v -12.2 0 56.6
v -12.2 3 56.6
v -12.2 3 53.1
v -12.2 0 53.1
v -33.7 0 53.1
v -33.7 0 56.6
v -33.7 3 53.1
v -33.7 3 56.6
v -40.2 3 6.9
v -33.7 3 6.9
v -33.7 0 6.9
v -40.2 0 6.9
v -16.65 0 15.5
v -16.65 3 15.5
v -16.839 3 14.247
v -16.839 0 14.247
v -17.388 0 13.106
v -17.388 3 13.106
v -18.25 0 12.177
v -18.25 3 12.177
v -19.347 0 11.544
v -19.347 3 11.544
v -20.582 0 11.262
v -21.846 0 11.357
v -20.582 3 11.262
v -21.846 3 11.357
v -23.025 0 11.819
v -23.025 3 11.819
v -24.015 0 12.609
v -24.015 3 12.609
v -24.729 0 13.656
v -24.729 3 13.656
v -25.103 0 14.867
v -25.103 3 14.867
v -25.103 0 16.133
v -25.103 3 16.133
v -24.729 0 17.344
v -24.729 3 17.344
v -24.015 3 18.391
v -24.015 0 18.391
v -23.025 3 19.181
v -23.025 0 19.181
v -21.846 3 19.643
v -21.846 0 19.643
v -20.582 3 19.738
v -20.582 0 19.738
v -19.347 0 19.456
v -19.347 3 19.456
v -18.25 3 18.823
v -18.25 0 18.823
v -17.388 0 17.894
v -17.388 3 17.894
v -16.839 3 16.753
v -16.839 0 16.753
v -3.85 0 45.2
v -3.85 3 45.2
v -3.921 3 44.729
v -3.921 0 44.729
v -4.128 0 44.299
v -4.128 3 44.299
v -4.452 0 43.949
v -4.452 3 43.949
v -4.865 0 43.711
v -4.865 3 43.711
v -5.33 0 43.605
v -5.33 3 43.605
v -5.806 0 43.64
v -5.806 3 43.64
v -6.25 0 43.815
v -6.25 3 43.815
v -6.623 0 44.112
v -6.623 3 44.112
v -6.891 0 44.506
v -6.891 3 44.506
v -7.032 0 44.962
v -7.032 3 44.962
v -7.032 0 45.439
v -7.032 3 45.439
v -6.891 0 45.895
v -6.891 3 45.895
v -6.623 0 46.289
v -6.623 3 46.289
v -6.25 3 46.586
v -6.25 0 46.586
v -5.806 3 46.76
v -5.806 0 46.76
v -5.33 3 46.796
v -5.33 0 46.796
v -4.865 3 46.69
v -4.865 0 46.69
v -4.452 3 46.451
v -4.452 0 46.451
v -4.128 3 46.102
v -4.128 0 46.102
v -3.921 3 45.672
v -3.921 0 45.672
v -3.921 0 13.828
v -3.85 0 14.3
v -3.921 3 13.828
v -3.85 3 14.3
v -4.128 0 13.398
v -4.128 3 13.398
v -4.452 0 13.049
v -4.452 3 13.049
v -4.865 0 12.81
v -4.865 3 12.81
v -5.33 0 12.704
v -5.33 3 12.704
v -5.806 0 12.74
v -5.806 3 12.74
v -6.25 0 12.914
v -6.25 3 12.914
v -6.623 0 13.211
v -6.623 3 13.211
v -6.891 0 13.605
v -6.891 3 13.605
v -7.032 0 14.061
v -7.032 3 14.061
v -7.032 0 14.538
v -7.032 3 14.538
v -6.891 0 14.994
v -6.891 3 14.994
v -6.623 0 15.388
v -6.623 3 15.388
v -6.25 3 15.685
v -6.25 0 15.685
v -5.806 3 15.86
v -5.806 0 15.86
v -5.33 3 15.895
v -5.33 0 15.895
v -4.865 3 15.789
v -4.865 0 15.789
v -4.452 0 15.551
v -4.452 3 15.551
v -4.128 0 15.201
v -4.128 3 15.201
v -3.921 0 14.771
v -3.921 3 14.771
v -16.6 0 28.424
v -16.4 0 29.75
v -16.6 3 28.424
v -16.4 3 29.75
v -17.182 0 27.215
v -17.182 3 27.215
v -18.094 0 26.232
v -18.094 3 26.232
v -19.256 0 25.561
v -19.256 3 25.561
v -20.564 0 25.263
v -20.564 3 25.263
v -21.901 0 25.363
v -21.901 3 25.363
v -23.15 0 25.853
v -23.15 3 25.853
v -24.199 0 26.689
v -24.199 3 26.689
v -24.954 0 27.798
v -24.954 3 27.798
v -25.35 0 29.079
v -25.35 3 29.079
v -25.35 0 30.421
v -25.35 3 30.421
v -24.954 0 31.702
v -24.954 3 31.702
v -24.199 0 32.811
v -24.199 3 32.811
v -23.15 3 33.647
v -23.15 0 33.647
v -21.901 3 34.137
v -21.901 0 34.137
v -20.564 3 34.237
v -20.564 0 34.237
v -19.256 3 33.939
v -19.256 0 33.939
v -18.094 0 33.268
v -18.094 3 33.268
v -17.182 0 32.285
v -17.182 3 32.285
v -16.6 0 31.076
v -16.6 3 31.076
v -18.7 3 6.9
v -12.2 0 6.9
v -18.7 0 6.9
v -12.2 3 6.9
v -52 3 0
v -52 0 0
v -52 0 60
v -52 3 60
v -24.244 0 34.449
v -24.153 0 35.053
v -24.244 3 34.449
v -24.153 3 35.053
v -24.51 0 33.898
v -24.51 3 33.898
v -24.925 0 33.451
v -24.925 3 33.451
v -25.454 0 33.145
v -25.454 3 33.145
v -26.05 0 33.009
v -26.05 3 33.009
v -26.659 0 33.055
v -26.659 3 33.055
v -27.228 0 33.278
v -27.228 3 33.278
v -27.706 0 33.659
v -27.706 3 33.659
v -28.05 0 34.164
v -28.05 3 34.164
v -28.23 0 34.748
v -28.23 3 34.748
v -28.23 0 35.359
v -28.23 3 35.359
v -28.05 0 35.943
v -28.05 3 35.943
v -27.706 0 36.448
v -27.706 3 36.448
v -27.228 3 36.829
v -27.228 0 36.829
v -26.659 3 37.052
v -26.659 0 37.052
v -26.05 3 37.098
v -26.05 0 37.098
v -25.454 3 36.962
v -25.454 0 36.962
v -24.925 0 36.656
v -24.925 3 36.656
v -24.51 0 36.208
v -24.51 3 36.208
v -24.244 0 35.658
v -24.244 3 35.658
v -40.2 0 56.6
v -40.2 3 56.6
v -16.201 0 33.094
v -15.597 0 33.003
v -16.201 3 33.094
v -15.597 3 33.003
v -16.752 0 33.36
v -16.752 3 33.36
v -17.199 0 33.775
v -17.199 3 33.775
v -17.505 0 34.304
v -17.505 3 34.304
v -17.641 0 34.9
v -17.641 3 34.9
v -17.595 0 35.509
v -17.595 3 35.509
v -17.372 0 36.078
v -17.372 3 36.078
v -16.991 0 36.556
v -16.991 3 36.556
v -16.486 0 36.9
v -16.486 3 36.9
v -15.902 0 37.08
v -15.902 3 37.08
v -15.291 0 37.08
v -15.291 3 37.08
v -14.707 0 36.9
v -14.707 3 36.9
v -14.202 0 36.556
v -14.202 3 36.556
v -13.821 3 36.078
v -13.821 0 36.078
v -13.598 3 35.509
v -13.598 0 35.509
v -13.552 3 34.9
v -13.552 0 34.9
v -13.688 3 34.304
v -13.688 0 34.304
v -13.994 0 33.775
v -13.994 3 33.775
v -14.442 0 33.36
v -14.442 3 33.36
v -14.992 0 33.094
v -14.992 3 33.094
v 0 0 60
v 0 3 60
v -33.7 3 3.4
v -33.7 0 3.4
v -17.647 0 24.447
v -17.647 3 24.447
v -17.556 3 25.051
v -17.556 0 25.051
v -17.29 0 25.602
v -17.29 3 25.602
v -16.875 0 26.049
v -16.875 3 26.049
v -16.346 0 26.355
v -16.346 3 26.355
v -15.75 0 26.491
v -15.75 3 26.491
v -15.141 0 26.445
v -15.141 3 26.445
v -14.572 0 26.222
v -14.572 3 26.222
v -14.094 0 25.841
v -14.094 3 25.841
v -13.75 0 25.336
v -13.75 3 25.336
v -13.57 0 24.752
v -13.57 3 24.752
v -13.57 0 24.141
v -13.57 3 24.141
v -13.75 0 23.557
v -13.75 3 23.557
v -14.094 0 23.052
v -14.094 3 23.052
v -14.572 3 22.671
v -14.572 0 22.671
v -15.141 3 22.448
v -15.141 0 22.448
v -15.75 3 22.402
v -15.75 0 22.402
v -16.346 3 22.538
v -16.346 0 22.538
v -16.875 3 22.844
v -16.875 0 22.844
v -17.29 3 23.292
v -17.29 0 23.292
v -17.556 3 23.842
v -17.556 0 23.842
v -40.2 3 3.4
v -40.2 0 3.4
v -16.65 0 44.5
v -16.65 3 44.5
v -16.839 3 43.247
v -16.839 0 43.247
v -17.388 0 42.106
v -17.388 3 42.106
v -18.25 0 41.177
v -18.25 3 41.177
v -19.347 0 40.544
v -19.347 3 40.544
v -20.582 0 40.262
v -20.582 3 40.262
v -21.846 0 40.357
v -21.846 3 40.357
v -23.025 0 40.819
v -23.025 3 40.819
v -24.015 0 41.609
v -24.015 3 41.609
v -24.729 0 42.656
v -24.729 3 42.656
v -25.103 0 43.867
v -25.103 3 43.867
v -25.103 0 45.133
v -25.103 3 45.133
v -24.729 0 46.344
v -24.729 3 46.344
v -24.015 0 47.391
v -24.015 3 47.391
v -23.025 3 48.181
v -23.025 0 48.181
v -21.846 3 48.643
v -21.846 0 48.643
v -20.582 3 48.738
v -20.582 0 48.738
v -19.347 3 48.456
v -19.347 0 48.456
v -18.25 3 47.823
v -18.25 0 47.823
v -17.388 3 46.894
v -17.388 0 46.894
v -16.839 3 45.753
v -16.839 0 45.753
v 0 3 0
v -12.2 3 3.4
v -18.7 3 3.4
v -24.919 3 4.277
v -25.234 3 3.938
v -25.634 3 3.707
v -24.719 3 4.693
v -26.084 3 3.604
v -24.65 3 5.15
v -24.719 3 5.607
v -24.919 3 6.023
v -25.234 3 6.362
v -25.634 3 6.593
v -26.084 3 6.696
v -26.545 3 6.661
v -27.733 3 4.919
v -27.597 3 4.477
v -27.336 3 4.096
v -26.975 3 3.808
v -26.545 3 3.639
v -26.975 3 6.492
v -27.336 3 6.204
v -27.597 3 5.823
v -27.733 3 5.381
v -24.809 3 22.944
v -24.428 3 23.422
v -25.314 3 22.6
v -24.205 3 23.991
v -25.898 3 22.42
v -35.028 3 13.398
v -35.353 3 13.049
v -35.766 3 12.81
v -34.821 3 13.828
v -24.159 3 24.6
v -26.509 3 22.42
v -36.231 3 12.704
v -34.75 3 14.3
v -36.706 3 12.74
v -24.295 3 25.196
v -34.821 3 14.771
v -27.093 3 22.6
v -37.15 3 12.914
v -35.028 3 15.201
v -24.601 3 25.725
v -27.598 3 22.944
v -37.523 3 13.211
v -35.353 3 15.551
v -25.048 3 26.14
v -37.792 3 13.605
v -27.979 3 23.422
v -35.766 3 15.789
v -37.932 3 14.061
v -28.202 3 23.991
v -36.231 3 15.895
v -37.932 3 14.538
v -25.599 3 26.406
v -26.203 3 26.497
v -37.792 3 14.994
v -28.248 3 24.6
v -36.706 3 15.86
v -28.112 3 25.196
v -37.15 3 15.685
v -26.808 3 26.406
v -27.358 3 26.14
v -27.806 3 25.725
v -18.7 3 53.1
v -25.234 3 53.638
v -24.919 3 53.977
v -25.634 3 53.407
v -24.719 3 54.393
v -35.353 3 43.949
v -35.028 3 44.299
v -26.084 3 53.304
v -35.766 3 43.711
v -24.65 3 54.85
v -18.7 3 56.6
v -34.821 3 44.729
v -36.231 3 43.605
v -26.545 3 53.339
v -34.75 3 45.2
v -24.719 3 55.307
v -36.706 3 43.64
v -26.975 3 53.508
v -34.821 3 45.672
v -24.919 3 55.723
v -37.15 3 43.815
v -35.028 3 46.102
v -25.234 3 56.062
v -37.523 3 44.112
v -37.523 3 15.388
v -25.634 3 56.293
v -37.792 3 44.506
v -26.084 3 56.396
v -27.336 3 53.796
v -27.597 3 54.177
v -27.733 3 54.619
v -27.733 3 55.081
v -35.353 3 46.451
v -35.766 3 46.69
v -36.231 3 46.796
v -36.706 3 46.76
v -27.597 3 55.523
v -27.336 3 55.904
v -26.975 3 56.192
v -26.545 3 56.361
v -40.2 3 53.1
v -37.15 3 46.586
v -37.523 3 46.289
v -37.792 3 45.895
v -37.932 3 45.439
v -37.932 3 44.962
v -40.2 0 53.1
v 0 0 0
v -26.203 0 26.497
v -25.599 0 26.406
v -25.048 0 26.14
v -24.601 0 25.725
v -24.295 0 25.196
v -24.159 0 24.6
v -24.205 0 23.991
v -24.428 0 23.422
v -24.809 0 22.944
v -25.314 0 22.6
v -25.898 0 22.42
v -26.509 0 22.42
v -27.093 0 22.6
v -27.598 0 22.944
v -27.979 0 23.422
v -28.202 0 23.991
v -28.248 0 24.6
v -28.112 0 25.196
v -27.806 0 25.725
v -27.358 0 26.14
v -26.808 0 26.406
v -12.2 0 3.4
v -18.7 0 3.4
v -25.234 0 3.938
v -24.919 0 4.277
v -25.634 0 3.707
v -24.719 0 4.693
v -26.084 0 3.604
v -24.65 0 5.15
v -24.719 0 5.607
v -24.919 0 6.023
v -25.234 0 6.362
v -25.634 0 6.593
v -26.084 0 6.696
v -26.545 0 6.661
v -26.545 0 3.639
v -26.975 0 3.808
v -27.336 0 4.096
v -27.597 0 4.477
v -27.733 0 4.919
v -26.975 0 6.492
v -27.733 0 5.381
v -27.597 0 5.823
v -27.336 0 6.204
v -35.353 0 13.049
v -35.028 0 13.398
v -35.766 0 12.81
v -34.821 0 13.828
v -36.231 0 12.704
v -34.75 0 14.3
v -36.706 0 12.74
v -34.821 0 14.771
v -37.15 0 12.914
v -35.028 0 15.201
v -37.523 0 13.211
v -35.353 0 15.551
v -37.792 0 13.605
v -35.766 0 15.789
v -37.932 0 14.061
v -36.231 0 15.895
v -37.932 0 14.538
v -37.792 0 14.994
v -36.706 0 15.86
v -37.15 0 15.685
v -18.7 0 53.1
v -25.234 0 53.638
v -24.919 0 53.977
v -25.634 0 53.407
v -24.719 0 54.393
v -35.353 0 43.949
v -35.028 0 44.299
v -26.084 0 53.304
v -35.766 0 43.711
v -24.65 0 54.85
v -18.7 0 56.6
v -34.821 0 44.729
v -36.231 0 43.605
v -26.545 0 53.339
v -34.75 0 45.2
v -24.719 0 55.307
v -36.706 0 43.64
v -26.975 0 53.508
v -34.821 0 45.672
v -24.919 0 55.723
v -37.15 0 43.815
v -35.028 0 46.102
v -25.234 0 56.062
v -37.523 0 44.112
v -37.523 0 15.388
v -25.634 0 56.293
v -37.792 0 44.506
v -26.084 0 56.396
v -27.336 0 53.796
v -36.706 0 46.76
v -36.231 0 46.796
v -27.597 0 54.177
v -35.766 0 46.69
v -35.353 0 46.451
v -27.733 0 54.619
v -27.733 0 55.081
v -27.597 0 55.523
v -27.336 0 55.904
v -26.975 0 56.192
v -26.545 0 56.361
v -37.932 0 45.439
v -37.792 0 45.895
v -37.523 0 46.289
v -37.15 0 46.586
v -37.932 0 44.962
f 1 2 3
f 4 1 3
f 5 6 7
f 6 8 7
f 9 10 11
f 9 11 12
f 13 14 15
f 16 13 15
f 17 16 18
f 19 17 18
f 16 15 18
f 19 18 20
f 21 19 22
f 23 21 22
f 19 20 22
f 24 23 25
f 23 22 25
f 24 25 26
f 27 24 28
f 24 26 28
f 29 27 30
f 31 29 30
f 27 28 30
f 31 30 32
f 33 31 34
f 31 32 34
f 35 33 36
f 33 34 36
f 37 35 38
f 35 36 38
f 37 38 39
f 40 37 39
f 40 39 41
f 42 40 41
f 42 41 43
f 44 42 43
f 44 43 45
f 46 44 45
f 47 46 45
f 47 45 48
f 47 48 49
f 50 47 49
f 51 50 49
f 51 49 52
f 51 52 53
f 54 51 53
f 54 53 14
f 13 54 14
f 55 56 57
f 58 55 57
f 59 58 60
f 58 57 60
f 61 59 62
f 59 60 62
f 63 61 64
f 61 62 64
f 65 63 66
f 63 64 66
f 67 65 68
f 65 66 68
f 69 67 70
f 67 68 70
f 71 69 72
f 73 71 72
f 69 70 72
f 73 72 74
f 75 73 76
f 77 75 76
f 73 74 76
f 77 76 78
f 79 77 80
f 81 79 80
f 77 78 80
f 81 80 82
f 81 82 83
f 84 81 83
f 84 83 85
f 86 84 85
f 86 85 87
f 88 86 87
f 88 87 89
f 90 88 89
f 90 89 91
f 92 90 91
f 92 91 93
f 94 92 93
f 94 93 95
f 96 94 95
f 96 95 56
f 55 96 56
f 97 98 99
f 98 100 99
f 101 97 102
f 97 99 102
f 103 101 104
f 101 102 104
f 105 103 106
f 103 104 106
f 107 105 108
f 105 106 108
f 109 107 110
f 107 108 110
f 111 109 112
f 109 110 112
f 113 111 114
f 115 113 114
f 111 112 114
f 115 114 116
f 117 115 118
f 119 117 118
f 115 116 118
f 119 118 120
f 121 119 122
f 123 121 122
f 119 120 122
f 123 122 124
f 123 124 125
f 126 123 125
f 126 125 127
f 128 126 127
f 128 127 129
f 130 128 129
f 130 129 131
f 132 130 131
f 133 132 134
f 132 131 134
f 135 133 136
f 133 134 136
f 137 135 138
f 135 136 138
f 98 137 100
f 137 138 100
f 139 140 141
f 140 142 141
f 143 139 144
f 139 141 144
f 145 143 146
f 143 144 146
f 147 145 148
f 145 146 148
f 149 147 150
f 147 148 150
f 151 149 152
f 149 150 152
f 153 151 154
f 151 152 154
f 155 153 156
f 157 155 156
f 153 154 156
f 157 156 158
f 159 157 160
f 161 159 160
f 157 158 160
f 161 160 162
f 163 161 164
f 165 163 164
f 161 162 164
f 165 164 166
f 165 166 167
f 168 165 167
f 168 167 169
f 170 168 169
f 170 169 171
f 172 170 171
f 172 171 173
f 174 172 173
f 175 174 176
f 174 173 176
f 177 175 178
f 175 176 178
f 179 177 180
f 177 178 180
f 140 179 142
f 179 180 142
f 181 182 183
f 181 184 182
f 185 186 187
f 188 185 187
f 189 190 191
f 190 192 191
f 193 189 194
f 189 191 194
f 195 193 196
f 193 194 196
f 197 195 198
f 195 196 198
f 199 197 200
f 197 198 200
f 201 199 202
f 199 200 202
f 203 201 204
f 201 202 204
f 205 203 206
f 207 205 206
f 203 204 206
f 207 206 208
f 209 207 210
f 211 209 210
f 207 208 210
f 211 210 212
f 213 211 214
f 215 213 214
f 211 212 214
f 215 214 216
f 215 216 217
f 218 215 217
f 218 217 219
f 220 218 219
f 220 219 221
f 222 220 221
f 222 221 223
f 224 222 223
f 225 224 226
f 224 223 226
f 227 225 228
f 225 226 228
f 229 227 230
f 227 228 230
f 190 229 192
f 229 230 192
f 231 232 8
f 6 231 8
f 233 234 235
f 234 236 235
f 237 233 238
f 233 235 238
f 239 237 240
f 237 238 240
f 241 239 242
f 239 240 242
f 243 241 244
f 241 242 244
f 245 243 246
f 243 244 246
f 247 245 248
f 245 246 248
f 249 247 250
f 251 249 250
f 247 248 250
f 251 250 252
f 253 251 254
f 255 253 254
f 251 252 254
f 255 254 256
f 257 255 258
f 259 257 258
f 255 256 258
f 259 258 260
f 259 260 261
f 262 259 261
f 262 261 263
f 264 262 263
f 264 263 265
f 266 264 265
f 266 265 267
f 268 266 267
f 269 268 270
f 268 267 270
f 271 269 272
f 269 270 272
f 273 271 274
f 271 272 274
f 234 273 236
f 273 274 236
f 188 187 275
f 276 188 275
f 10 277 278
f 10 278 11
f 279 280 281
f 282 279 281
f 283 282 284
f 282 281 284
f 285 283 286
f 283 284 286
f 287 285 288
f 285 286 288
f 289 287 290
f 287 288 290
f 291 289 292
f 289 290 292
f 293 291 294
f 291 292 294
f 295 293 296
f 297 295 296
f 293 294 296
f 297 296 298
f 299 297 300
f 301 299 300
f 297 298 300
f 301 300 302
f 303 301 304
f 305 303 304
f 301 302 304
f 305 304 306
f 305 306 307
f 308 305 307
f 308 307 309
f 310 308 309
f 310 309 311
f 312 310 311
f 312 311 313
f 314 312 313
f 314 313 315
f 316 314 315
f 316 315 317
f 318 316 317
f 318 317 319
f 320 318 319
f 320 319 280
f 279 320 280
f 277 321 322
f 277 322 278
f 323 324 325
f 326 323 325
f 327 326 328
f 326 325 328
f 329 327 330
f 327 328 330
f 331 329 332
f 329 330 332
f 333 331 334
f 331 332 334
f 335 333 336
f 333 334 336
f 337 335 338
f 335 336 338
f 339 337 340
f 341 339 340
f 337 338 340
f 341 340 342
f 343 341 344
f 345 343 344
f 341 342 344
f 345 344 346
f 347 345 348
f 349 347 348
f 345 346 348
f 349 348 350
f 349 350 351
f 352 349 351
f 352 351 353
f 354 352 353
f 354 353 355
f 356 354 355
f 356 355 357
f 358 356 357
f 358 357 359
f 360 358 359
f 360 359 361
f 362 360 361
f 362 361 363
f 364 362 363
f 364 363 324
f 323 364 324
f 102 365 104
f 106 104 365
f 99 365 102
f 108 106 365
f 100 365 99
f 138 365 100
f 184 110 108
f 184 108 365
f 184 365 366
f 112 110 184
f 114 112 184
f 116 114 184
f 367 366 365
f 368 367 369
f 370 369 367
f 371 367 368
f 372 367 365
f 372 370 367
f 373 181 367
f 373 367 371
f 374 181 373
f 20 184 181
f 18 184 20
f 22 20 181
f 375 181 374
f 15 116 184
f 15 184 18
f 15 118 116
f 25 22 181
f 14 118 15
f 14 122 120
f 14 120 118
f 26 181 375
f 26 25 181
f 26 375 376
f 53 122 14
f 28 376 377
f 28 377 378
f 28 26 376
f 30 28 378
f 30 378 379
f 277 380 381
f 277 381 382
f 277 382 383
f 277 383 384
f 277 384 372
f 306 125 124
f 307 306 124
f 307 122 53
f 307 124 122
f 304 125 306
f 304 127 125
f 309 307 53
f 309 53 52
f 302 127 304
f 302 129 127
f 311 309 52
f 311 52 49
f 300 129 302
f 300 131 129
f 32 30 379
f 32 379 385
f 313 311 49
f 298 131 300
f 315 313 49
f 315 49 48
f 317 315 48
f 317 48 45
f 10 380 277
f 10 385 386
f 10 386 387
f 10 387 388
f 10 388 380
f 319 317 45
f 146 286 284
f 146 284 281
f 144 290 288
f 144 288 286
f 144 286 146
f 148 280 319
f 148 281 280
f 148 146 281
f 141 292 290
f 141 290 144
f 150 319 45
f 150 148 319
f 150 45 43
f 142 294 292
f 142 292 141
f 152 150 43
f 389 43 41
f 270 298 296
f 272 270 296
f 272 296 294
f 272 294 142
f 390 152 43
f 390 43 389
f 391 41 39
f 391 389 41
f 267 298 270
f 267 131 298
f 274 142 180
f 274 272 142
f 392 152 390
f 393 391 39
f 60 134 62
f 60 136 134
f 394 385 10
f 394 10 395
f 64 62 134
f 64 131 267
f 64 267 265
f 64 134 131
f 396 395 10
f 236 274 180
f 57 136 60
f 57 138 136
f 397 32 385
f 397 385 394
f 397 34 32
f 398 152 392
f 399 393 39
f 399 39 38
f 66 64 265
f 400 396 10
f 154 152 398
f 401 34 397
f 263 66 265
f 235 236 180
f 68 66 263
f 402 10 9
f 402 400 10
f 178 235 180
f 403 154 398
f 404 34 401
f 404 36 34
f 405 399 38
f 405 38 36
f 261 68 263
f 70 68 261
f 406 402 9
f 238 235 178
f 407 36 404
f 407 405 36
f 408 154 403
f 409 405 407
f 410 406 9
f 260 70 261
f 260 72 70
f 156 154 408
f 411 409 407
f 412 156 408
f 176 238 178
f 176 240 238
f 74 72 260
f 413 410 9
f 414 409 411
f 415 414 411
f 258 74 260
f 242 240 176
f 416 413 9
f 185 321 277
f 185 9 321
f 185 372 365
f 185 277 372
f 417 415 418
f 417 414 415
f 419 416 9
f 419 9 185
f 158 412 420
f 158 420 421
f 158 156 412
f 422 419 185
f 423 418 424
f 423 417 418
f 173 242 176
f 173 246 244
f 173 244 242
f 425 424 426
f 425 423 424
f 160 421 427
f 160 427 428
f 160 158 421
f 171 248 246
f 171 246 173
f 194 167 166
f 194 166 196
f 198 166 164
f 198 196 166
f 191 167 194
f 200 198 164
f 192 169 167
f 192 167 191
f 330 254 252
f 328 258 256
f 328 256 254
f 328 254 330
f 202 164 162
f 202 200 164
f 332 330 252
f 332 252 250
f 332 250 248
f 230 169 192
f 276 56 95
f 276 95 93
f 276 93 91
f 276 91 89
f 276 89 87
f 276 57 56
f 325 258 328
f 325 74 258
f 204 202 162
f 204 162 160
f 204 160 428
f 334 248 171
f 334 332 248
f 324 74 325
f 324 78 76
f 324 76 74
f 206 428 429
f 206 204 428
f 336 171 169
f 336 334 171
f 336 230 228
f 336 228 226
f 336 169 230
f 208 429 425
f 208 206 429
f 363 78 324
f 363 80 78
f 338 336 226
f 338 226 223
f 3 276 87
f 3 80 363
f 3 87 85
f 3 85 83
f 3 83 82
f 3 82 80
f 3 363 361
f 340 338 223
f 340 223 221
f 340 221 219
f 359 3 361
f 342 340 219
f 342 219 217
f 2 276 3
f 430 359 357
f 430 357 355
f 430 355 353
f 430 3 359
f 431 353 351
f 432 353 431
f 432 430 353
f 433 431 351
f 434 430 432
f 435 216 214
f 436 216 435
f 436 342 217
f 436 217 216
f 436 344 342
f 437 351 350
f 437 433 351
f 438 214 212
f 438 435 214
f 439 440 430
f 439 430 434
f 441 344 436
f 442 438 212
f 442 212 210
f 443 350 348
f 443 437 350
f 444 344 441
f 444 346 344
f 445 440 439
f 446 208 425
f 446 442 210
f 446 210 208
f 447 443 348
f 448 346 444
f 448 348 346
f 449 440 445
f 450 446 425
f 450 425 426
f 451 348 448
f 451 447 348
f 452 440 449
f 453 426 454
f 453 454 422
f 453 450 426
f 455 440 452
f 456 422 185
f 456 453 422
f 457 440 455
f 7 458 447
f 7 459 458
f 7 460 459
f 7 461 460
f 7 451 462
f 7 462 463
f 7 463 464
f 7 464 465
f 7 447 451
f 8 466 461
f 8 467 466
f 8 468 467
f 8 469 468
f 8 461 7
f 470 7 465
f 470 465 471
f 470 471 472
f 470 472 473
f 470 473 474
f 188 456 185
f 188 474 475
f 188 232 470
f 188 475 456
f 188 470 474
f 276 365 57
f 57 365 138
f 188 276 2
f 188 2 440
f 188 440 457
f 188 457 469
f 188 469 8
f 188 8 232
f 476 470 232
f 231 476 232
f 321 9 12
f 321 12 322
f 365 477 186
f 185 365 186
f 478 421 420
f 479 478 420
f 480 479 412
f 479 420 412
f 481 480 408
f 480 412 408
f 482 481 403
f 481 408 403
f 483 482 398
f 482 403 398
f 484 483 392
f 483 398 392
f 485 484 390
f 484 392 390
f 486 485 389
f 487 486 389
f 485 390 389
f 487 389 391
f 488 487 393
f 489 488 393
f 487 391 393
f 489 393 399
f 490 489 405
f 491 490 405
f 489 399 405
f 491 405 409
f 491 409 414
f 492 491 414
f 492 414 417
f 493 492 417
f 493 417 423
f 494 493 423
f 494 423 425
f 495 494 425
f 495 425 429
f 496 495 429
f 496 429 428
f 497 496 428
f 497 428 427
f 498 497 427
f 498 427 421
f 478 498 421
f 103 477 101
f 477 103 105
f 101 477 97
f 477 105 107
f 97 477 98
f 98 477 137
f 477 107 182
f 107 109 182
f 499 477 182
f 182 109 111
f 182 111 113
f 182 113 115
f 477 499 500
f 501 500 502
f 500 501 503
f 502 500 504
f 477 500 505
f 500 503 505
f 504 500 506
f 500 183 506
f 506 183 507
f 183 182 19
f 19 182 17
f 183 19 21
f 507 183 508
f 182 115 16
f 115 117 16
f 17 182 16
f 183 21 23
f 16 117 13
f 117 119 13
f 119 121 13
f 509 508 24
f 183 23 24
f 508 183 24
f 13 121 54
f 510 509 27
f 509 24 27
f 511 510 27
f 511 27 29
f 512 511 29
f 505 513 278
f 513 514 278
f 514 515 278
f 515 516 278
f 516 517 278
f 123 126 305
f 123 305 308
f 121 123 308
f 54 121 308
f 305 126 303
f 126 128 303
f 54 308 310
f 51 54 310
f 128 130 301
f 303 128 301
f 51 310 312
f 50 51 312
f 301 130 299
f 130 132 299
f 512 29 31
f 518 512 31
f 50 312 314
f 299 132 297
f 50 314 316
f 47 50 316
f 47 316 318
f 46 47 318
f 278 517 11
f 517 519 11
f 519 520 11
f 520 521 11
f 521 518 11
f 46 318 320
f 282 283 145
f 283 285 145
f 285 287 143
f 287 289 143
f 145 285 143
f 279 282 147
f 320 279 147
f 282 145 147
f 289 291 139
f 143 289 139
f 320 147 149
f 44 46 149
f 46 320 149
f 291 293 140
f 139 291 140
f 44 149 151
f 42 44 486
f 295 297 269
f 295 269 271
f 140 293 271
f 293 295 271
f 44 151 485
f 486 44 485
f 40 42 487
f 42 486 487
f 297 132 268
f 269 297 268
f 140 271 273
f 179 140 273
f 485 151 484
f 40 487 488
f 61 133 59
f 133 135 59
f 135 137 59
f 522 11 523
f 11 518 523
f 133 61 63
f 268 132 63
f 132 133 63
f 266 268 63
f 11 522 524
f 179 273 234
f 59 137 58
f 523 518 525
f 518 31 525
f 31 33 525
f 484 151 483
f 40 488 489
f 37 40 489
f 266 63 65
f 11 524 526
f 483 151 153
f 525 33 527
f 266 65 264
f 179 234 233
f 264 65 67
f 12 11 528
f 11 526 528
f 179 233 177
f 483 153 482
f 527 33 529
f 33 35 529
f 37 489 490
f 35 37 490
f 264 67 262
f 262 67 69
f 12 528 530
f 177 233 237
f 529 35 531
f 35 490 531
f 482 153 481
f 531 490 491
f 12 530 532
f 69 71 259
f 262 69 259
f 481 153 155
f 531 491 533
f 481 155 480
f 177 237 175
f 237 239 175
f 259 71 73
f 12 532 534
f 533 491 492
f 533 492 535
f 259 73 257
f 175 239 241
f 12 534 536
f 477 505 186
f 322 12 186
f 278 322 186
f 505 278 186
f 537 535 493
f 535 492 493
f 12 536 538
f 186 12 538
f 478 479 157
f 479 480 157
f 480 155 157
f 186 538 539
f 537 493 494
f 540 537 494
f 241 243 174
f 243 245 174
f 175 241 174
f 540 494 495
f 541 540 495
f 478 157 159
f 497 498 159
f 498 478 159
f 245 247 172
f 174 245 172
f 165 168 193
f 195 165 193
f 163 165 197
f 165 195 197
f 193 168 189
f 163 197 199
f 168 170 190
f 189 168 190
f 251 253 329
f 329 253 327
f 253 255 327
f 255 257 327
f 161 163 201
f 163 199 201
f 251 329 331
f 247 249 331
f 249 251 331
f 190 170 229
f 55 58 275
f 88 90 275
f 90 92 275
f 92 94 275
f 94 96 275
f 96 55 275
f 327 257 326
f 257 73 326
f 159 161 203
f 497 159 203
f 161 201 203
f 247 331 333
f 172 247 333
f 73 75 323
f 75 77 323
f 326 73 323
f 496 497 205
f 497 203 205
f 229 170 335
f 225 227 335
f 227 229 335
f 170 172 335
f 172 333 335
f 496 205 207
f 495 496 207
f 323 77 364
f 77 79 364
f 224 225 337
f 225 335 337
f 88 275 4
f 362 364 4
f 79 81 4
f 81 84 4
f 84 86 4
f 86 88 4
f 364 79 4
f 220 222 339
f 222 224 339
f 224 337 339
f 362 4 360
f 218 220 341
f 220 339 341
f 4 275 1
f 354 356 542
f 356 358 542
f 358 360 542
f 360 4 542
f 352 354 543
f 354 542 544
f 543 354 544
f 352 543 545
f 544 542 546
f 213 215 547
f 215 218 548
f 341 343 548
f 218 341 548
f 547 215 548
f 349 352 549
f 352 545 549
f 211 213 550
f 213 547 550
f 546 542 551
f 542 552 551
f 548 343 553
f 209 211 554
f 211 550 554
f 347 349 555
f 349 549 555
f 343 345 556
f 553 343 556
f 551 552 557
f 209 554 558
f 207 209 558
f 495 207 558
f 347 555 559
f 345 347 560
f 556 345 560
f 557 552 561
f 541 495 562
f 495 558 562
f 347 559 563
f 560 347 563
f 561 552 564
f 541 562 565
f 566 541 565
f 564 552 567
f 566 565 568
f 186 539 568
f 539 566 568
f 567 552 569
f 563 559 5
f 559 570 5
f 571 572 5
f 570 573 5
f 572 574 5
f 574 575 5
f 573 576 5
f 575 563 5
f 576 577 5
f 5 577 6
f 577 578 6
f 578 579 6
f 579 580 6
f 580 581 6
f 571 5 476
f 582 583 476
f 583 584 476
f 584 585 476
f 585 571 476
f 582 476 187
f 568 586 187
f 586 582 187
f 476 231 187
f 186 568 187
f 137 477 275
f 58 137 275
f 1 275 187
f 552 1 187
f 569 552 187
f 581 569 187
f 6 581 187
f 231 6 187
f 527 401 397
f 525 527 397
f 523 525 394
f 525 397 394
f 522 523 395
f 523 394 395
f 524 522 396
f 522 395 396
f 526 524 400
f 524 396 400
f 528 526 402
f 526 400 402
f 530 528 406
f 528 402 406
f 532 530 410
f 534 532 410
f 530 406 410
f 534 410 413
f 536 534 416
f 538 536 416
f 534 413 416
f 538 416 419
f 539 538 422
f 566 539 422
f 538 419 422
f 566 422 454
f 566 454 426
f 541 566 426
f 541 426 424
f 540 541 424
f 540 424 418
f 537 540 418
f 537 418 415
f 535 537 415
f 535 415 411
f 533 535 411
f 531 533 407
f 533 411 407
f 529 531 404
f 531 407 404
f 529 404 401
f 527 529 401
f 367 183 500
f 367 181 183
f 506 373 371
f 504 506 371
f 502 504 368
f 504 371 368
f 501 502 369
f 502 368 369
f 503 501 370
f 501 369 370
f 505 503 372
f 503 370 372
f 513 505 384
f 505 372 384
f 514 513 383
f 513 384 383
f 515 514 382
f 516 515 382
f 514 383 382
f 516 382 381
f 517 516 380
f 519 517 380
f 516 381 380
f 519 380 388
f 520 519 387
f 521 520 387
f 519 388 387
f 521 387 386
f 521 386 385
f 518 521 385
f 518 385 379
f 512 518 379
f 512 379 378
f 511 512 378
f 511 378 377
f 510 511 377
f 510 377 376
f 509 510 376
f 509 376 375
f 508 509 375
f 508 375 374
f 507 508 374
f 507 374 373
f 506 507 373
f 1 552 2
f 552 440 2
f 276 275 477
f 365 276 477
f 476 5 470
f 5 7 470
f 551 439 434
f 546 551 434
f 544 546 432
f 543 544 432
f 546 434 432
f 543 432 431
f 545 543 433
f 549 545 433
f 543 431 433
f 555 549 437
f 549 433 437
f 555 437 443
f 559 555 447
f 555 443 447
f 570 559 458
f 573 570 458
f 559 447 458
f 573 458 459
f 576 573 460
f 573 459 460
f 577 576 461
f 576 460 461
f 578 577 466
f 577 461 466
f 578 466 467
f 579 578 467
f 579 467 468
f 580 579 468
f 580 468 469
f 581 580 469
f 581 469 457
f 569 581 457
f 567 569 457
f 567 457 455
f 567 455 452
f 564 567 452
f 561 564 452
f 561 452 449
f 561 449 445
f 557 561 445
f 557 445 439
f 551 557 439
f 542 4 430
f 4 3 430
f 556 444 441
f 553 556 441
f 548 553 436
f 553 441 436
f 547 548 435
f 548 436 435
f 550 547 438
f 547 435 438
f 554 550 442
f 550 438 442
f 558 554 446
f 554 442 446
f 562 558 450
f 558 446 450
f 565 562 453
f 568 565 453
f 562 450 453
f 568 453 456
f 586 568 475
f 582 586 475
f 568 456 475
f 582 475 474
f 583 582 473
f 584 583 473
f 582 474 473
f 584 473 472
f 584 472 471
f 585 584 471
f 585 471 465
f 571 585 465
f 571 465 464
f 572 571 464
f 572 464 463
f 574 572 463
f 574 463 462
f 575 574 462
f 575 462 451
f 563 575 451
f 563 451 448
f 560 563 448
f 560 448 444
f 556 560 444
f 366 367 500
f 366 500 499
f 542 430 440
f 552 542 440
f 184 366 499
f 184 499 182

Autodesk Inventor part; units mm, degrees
ref_plane "YZ Plane" through (0, 0, 0) normal (1, 0, 0) x (0, 1, 0)
ref_plane "XZ Plane" through (0, 0, 0) normal (0, 1, 0) x (-1, 0, 0)
ref_plane "XY Plane" through (0, 0, 0) normal (0, 0, 1) x (1, 0, 0)
sketch "Sketch1" plane through (0, 0, 0) normal (0, 1, 0) x (-1, 0, 0)
  line L0 (0, 0) -> (52, 0)
  line L1 (52, 0) -> (52, 60)
  line L2 (52, 60) -> (0, 60)
  line L3 (0, 60) -> (0, 0)
  dimension "d0" = 52
  dimension "d1" = 60
extrude "Extrusion1" add sketch "Sketch1" along normal blind 3
sketch "Sketch2" plane through (0, 3, 0) normal (0, 1, 0) x (1, 0, 0)
  line L0 (-52, 0) -> (-52, -60) projected
  line L1 (-52, 0) -> (-40.2, 0)
  line L2 (-40.2, 0) -> (-40.2, -3.4)
  line L3 (-40.2, -3.4) -> (-52, -3.4)
  line L4 (-52, -3.4) -> (-52, 0)
  line L5 (-40.2, -3.4) -> (-33.7, -3.4)
  line L6 (-33.7, -3.4) -> (-33.7, -6.9)
  line L7 (-33.7, -6.9) -> (-40.2, -6.9)
  line L8 (-40.2, -6.9) -> (-40.2, -3.4)
  line L9 (-33.7, -3.4) -> (-18.7, -3.4)
  line L10 (-18.7, -3.4) -> (-12.2, -3.4)
  line L11 (-12.2, -3.4) -> (-12.2, -6.9)
  line L12 (-12.2, -6.9) -> (-18.7, -6.9)
  line L13 (-18.7, -6.9) -> (-18.7, -3.4)
  line L14 (-52, -30) -> (0, -30)
  line L15 (0, -60) -> (0, 0) projected
  line L16 (-40.2, -56.6) -> (-33.7, -56.6)
  line L17 (-33.7, -56.6) -> (-33.7, -53.1)
  line L18 (-33.7, -53.1) -> (-40.2, -53.1)
  line L19 (-40.2, -53.1) -> (-40.2, -56.6)
  line L20 (-18.7, -56.6) -> (-12.2, -56.6)
  line L21 (-12.2, -56.6) -> (-12.2, -53.1)
  line L22 (-12.2, -53.1) -> (-18.7, -53.1)
  line L23 (-18.7, -53.1) -> (-18.7, -56.6)
  dimension "d4" = 11.8
  dimension "d5" = 3.4
  dimension "d6" = 6.5
  dimension "d7" = 3.5
  dimension "d8" = 15
  dimension "d9" = 6.5
  dimension "d10" = 3.5
extrude "Extrusion2" cut sketch "Sketch2" against normal blind 3 contours L10 L11 L12 L13 | L5 L6 L7 L8 | L19 L18 L17 L16 | L23 L22 L21 L20
sketch "Sketch3" plane through (0, 3, 0) normal (0, 1, 0) x (1, 0, 0)
  line L0 (-52, -60) -> (0, -60) projected
  line L1 (-52, -60) -> (-20.9, -60)
  line L2 (-20.9, -60) -> (-20.9, -44.5)
  line L3 (-20.9, -44.5) -> (-52, -44.5)
  line L4 (-52, -44.5) -> (-52, -60)
  circle A0 centre (-20.9, -44.5) radius 4.25
  line L5 (-52, 0) -> (-52, -60) projected
  line L6 (-52, -30) -> (0, -30)
  line L7 (0, -60) -> (0, 0) projected
  circle A1 centre (-20.9, -15.5) radius 4.25
  dimension "d13" = 31.1
  dimension "d14" = 15.5
  dimension "d15" = 8.5
extrude "Extrusion3" cut sketch "Sketch3" against normal blind 3 contours A0 L3 L2 | L2 L3 A0 | A1
sketch "Sketch4" plane through (0, 3, 0) normal (0, 1, 0) x (1, 0, 0)
  circle A0 centre (-20.9, -44.5) radius 4.25 projected
  line L0 (-20.9, -40.25) -> (-20.9, -29.75)
  circle A1 centre (-20.9, -29.75) radius 4.5
  point P0 (0, 0)
  dimension "d18" = 10.5
  dimension "d19" = 9
extrude "Extrusion4" cut sketch "Sketch4" against normal blind 3 contours A1
sketch "Sketch5" plane through (0, 3, 0) normal (0, 1, 0) x (1, 0, 0)
  circle A0 centre (-20.9, -29.75) radius 4.5 projected
  line L0 (-20.9, -29.75) -> (-26.2033, -35.0533)
  line L1 (-20.9, -29.75) -> (-13.4, -29.75) construction
  circle A1 centre (-26.2033, -35.0533) radius 2.05
  point P0 (0, 0)
  dimension "d22" = 7.5
  dimension "d23" = 135
  dimension "d24" = 4.1
extrude "Extrusion5" cut sketch "Sketch5" against normal blind 3 contours A1
pattern_circular "Circular Pattern1" count 4 over 360 about axis through (-20.9, 3, 29.75) along (0, -1, 0) of "Extrusion5"
sketch "Sketch6" plane through (0, 3, 0) normal (0, 1, 0) x (1, 0, 0)
  circle A0 centre (-20.9, -29.75) radius 4.5 projected
  line L0 (-20.9, -29.75) -> (-5.4497, -45.2003)
  line L1 (-20.9, -29.75) -> (0.95, -29.75) construction
  circle A1 centre (-5.4497, -45.2003) radius 1.6
  line L2 (-20.9, -29.75) -> (-5.4497, -14.2997)
  line L3 (-20.9, -29.75) -> (-36.3503, -45.2003)
  line L4 (-20.9, -29.75) -> (-36.3503, -14.2997)
  circle A2 centre (-36.3503, -45.2003) radius 1.6
  circle A3 centre (-36.3503, -14.2997) radius 1.6
  circle A4 centre (-5.4497, -14.2997) radius 1.6
  point P0 (0, 0)
  dimension "d30" = 21.85
  dimension "d31" = 45
  dimension "d32" = 3.2
  dimension "d35" = 21.85
  dimension "d36" = 21.85
  dimension "d37" = 21.85
  dimension "d38" = 3.2
  dimension "d39" = 3.2
  dimension "d40" = 3.2
extrude "Extrusion6" cut sketch "Sketch6" against normal blind 3.2 contours A1 | A2 | A3 | A4
sketch "Sketch7" plane through (0, 3, 0) normal (0, 1, 0) x (1, 0, 0)
  line L0 (-33.7, -6.9) -> (-33.7, -3.4) projected
  line L1 (-33.7, -5.15) -> (-26.2, -5.15)
  line L2 (-52, 0) -> (-52, -60) projected
  line L3 (-52, -30) -> (-2, -30)
  circle A0 centre (-26.2, -5.15) radius 1.55
  circle A1 centre (-26.2, -54.85) radius 1.55
  point P0 (0, 0)
  dimension "d41" = 7.5
  dimension "d42" = 50
  dimension "d43" = 3.1
extrude "Extrusion7" cut sketch "Sketch7" against normal blind 3.1
equation "\"d33\" = d39"
equation "\"d44\" = d43"
properties part number "pumpeplade"
